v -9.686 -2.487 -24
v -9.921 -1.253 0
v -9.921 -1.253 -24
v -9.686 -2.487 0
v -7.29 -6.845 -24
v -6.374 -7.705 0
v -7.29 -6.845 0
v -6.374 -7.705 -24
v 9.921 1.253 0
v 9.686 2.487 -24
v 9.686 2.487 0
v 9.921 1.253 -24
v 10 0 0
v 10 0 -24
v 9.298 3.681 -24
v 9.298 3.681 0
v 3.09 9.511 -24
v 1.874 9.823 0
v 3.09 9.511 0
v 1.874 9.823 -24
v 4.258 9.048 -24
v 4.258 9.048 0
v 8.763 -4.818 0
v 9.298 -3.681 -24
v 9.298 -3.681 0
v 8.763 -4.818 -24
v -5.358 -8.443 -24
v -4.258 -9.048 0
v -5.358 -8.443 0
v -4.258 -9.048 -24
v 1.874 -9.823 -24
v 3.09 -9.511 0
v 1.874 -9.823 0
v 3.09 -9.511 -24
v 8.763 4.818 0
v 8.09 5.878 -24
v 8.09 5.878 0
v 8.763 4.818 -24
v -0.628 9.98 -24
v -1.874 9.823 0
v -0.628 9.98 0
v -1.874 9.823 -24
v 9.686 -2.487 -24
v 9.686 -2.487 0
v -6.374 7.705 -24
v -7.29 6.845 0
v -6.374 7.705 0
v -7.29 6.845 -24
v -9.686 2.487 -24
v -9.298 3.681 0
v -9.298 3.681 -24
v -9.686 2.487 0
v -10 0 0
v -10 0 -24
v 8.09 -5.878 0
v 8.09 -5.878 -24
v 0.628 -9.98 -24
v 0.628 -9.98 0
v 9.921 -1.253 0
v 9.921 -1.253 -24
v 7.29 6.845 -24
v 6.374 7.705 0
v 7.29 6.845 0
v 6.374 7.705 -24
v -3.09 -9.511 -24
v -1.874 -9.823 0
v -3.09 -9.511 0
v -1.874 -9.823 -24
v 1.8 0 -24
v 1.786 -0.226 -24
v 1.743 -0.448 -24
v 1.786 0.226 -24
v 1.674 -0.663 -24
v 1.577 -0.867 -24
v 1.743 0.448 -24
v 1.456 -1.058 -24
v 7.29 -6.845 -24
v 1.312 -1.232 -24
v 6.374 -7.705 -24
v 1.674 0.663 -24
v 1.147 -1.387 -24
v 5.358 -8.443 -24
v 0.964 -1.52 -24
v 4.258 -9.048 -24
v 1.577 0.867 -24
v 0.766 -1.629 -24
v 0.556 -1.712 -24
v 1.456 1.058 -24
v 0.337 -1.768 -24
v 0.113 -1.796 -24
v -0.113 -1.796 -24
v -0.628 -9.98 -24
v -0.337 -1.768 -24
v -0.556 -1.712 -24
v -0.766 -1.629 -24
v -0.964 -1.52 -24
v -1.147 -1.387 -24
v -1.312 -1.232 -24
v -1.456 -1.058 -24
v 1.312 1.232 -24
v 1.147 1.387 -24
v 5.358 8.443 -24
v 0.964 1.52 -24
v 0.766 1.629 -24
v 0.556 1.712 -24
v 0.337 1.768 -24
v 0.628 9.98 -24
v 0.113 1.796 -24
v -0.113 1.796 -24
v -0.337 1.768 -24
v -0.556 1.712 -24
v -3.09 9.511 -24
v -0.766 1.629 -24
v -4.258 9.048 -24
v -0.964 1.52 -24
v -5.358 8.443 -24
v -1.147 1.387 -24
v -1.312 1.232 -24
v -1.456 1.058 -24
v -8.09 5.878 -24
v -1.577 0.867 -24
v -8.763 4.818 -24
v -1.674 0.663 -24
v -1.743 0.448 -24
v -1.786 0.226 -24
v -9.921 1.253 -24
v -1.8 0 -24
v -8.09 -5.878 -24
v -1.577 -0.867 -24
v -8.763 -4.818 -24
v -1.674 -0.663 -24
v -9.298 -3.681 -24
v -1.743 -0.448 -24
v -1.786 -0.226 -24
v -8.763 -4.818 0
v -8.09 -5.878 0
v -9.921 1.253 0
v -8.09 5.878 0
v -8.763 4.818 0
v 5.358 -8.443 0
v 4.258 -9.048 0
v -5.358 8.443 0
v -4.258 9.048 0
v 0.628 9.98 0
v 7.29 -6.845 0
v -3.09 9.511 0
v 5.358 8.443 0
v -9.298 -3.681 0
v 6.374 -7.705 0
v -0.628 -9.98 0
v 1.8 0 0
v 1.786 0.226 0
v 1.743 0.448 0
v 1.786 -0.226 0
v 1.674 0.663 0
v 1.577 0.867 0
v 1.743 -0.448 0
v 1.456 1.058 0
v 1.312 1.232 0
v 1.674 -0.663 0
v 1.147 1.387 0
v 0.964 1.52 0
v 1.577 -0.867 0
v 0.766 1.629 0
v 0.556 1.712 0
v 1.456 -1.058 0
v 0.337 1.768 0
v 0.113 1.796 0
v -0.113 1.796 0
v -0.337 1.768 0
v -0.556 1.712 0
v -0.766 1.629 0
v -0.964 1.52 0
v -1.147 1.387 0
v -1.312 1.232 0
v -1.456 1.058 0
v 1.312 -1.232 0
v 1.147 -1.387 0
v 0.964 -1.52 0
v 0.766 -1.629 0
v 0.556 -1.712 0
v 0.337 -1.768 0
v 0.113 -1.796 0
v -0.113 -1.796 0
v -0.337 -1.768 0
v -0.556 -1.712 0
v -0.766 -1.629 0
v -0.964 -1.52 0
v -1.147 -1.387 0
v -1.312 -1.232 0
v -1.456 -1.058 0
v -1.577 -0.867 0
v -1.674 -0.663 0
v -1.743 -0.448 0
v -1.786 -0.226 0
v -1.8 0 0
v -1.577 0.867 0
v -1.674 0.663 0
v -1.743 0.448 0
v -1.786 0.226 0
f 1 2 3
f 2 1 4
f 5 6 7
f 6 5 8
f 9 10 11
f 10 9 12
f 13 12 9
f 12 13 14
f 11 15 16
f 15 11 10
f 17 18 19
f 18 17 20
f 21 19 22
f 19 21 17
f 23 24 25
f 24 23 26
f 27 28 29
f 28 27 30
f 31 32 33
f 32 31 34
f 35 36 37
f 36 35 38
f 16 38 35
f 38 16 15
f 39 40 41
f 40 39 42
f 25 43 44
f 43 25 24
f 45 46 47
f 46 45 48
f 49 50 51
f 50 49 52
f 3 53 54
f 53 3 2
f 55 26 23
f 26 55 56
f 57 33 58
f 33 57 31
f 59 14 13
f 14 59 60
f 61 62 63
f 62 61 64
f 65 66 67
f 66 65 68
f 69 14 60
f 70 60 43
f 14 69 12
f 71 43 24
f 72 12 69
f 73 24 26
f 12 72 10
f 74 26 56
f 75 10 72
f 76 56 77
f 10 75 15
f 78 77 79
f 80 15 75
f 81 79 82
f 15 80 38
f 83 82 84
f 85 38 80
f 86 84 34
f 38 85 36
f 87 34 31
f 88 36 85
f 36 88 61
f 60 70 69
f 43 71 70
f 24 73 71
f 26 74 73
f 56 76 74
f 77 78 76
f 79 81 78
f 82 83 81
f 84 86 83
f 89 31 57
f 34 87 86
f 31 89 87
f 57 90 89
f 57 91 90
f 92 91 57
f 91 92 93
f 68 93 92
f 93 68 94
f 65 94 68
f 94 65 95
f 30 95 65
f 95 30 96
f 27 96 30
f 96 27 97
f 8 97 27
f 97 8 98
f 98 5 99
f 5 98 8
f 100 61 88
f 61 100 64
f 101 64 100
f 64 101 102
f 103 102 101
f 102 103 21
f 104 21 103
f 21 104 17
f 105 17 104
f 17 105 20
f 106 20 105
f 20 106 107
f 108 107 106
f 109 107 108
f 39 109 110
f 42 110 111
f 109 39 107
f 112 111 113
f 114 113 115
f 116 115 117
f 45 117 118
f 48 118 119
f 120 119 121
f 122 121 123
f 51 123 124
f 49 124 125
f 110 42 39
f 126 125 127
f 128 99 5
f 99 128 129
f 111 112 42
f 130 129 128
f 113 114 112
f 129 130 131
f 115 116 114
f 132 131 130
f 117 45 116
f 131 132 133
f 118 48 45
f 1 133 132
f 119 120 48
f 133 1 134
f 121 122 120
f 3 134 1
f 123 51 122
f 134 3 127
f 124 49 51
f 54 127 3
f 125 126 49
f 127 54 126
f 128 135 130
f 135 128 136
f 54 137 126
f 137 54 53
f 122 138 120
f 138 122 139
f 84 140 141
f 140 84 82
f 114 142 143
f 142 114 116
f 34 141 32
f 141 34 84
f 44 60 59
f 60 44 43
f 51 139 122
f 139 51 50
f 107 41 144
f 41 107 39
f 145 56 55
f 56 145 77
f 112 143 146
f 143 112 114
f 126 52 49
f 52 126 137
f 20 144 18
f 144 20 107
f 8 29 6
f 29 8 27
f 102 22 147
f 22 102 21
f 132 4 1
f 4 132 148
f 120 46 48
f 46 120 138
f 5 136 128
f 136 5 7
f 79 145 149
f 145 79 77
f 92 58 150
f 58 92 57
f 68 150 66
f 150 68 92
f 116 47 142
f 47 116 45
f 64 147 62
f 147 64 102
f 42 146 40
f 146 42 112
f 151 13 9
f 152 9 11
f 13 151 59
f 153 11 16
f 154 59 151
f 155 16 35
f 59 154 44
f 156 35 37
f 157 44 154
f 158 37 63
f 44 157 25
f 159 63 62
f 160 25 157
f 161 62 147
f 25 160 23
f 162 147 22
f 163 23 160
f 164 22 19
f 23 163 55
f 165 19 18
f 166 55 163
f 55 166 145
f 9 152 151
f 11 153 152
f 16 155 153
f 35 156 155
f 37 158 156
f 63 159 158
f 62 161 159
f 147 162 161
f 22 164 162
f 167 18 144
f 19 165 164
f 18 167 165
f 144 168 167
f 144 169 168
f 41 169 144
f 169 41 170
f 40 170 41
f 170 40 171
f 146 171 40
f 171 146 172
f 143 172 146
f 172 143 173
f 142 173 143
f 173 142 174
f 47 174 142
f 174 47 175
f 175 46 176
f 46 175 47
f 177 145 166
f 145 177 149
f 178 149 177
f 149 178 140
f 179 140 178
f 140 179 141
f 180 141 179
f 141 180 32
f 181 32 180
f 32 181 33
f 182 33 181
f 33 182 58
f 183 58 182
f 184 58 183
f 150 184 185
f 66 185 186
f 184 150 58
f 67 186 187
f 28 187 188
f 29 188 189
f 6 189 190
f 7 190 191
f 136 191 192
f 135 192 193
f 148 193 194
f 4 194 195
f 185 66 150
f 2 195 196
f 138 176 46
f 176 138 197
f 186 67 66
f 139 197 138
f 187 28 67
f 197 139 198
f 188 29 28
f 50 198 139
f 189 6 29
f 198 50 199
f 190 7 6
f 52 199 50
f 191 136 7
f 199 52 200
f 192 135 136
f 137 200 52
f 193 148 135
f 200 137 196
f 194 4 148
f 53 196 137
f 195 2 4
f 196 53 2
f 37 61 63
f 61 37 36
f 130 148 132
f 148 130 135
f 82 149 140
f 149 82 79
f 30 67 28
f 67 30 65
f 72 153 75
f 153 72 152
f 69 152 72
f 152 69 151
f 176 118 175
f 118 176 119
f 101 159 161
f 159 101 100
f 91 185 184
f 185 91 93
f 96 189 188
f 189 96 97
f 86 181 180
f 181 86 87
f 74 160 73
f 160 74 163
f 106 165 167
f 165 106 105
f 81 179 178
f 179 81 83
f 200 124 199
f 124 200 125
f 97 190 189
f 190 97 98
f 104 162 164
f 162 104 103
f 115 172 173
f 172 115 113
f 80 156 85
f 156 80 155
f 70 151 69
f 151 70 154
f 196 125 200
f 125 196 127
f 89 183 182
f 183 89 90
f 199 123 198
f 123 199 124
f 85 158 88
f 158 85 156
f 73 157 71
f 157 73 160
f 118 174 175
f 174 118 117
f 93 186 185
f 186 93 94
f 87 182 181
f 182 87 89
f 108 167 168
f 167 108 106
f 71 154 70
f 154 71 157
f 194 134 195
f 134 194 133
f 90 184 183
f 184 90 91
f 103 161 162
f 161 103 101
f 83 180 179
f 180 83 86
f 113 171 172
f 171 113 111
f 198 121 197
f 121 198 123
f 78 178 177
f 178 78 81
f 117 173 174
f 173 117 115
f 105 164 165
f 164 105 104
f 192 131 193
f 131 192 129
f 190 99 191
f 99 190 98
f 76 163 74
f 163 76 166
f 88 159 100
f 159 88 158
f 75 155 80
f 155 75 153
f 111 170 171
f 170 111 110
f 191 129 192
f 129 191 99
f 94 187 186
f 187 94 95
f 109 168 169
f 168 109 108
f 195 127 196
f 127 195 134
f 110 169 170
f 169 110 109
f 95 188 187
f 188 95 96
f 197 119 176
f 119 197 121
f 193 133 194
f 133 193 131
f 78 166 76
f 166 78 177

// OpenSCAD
$fn = 50;


difference() {
	union() {
		translate(v = [0, 0, -24.0000000000]) {
			cylinder(h = 24, r = 10.0000000000);
		}
		cylinder(h = 0, r = 20.0000000000);
	}
	union() {
		#translate(v = [0, 0, -24]) {
			cylinder(h = 24, r = 1.8000000000);
		}
	}
}
